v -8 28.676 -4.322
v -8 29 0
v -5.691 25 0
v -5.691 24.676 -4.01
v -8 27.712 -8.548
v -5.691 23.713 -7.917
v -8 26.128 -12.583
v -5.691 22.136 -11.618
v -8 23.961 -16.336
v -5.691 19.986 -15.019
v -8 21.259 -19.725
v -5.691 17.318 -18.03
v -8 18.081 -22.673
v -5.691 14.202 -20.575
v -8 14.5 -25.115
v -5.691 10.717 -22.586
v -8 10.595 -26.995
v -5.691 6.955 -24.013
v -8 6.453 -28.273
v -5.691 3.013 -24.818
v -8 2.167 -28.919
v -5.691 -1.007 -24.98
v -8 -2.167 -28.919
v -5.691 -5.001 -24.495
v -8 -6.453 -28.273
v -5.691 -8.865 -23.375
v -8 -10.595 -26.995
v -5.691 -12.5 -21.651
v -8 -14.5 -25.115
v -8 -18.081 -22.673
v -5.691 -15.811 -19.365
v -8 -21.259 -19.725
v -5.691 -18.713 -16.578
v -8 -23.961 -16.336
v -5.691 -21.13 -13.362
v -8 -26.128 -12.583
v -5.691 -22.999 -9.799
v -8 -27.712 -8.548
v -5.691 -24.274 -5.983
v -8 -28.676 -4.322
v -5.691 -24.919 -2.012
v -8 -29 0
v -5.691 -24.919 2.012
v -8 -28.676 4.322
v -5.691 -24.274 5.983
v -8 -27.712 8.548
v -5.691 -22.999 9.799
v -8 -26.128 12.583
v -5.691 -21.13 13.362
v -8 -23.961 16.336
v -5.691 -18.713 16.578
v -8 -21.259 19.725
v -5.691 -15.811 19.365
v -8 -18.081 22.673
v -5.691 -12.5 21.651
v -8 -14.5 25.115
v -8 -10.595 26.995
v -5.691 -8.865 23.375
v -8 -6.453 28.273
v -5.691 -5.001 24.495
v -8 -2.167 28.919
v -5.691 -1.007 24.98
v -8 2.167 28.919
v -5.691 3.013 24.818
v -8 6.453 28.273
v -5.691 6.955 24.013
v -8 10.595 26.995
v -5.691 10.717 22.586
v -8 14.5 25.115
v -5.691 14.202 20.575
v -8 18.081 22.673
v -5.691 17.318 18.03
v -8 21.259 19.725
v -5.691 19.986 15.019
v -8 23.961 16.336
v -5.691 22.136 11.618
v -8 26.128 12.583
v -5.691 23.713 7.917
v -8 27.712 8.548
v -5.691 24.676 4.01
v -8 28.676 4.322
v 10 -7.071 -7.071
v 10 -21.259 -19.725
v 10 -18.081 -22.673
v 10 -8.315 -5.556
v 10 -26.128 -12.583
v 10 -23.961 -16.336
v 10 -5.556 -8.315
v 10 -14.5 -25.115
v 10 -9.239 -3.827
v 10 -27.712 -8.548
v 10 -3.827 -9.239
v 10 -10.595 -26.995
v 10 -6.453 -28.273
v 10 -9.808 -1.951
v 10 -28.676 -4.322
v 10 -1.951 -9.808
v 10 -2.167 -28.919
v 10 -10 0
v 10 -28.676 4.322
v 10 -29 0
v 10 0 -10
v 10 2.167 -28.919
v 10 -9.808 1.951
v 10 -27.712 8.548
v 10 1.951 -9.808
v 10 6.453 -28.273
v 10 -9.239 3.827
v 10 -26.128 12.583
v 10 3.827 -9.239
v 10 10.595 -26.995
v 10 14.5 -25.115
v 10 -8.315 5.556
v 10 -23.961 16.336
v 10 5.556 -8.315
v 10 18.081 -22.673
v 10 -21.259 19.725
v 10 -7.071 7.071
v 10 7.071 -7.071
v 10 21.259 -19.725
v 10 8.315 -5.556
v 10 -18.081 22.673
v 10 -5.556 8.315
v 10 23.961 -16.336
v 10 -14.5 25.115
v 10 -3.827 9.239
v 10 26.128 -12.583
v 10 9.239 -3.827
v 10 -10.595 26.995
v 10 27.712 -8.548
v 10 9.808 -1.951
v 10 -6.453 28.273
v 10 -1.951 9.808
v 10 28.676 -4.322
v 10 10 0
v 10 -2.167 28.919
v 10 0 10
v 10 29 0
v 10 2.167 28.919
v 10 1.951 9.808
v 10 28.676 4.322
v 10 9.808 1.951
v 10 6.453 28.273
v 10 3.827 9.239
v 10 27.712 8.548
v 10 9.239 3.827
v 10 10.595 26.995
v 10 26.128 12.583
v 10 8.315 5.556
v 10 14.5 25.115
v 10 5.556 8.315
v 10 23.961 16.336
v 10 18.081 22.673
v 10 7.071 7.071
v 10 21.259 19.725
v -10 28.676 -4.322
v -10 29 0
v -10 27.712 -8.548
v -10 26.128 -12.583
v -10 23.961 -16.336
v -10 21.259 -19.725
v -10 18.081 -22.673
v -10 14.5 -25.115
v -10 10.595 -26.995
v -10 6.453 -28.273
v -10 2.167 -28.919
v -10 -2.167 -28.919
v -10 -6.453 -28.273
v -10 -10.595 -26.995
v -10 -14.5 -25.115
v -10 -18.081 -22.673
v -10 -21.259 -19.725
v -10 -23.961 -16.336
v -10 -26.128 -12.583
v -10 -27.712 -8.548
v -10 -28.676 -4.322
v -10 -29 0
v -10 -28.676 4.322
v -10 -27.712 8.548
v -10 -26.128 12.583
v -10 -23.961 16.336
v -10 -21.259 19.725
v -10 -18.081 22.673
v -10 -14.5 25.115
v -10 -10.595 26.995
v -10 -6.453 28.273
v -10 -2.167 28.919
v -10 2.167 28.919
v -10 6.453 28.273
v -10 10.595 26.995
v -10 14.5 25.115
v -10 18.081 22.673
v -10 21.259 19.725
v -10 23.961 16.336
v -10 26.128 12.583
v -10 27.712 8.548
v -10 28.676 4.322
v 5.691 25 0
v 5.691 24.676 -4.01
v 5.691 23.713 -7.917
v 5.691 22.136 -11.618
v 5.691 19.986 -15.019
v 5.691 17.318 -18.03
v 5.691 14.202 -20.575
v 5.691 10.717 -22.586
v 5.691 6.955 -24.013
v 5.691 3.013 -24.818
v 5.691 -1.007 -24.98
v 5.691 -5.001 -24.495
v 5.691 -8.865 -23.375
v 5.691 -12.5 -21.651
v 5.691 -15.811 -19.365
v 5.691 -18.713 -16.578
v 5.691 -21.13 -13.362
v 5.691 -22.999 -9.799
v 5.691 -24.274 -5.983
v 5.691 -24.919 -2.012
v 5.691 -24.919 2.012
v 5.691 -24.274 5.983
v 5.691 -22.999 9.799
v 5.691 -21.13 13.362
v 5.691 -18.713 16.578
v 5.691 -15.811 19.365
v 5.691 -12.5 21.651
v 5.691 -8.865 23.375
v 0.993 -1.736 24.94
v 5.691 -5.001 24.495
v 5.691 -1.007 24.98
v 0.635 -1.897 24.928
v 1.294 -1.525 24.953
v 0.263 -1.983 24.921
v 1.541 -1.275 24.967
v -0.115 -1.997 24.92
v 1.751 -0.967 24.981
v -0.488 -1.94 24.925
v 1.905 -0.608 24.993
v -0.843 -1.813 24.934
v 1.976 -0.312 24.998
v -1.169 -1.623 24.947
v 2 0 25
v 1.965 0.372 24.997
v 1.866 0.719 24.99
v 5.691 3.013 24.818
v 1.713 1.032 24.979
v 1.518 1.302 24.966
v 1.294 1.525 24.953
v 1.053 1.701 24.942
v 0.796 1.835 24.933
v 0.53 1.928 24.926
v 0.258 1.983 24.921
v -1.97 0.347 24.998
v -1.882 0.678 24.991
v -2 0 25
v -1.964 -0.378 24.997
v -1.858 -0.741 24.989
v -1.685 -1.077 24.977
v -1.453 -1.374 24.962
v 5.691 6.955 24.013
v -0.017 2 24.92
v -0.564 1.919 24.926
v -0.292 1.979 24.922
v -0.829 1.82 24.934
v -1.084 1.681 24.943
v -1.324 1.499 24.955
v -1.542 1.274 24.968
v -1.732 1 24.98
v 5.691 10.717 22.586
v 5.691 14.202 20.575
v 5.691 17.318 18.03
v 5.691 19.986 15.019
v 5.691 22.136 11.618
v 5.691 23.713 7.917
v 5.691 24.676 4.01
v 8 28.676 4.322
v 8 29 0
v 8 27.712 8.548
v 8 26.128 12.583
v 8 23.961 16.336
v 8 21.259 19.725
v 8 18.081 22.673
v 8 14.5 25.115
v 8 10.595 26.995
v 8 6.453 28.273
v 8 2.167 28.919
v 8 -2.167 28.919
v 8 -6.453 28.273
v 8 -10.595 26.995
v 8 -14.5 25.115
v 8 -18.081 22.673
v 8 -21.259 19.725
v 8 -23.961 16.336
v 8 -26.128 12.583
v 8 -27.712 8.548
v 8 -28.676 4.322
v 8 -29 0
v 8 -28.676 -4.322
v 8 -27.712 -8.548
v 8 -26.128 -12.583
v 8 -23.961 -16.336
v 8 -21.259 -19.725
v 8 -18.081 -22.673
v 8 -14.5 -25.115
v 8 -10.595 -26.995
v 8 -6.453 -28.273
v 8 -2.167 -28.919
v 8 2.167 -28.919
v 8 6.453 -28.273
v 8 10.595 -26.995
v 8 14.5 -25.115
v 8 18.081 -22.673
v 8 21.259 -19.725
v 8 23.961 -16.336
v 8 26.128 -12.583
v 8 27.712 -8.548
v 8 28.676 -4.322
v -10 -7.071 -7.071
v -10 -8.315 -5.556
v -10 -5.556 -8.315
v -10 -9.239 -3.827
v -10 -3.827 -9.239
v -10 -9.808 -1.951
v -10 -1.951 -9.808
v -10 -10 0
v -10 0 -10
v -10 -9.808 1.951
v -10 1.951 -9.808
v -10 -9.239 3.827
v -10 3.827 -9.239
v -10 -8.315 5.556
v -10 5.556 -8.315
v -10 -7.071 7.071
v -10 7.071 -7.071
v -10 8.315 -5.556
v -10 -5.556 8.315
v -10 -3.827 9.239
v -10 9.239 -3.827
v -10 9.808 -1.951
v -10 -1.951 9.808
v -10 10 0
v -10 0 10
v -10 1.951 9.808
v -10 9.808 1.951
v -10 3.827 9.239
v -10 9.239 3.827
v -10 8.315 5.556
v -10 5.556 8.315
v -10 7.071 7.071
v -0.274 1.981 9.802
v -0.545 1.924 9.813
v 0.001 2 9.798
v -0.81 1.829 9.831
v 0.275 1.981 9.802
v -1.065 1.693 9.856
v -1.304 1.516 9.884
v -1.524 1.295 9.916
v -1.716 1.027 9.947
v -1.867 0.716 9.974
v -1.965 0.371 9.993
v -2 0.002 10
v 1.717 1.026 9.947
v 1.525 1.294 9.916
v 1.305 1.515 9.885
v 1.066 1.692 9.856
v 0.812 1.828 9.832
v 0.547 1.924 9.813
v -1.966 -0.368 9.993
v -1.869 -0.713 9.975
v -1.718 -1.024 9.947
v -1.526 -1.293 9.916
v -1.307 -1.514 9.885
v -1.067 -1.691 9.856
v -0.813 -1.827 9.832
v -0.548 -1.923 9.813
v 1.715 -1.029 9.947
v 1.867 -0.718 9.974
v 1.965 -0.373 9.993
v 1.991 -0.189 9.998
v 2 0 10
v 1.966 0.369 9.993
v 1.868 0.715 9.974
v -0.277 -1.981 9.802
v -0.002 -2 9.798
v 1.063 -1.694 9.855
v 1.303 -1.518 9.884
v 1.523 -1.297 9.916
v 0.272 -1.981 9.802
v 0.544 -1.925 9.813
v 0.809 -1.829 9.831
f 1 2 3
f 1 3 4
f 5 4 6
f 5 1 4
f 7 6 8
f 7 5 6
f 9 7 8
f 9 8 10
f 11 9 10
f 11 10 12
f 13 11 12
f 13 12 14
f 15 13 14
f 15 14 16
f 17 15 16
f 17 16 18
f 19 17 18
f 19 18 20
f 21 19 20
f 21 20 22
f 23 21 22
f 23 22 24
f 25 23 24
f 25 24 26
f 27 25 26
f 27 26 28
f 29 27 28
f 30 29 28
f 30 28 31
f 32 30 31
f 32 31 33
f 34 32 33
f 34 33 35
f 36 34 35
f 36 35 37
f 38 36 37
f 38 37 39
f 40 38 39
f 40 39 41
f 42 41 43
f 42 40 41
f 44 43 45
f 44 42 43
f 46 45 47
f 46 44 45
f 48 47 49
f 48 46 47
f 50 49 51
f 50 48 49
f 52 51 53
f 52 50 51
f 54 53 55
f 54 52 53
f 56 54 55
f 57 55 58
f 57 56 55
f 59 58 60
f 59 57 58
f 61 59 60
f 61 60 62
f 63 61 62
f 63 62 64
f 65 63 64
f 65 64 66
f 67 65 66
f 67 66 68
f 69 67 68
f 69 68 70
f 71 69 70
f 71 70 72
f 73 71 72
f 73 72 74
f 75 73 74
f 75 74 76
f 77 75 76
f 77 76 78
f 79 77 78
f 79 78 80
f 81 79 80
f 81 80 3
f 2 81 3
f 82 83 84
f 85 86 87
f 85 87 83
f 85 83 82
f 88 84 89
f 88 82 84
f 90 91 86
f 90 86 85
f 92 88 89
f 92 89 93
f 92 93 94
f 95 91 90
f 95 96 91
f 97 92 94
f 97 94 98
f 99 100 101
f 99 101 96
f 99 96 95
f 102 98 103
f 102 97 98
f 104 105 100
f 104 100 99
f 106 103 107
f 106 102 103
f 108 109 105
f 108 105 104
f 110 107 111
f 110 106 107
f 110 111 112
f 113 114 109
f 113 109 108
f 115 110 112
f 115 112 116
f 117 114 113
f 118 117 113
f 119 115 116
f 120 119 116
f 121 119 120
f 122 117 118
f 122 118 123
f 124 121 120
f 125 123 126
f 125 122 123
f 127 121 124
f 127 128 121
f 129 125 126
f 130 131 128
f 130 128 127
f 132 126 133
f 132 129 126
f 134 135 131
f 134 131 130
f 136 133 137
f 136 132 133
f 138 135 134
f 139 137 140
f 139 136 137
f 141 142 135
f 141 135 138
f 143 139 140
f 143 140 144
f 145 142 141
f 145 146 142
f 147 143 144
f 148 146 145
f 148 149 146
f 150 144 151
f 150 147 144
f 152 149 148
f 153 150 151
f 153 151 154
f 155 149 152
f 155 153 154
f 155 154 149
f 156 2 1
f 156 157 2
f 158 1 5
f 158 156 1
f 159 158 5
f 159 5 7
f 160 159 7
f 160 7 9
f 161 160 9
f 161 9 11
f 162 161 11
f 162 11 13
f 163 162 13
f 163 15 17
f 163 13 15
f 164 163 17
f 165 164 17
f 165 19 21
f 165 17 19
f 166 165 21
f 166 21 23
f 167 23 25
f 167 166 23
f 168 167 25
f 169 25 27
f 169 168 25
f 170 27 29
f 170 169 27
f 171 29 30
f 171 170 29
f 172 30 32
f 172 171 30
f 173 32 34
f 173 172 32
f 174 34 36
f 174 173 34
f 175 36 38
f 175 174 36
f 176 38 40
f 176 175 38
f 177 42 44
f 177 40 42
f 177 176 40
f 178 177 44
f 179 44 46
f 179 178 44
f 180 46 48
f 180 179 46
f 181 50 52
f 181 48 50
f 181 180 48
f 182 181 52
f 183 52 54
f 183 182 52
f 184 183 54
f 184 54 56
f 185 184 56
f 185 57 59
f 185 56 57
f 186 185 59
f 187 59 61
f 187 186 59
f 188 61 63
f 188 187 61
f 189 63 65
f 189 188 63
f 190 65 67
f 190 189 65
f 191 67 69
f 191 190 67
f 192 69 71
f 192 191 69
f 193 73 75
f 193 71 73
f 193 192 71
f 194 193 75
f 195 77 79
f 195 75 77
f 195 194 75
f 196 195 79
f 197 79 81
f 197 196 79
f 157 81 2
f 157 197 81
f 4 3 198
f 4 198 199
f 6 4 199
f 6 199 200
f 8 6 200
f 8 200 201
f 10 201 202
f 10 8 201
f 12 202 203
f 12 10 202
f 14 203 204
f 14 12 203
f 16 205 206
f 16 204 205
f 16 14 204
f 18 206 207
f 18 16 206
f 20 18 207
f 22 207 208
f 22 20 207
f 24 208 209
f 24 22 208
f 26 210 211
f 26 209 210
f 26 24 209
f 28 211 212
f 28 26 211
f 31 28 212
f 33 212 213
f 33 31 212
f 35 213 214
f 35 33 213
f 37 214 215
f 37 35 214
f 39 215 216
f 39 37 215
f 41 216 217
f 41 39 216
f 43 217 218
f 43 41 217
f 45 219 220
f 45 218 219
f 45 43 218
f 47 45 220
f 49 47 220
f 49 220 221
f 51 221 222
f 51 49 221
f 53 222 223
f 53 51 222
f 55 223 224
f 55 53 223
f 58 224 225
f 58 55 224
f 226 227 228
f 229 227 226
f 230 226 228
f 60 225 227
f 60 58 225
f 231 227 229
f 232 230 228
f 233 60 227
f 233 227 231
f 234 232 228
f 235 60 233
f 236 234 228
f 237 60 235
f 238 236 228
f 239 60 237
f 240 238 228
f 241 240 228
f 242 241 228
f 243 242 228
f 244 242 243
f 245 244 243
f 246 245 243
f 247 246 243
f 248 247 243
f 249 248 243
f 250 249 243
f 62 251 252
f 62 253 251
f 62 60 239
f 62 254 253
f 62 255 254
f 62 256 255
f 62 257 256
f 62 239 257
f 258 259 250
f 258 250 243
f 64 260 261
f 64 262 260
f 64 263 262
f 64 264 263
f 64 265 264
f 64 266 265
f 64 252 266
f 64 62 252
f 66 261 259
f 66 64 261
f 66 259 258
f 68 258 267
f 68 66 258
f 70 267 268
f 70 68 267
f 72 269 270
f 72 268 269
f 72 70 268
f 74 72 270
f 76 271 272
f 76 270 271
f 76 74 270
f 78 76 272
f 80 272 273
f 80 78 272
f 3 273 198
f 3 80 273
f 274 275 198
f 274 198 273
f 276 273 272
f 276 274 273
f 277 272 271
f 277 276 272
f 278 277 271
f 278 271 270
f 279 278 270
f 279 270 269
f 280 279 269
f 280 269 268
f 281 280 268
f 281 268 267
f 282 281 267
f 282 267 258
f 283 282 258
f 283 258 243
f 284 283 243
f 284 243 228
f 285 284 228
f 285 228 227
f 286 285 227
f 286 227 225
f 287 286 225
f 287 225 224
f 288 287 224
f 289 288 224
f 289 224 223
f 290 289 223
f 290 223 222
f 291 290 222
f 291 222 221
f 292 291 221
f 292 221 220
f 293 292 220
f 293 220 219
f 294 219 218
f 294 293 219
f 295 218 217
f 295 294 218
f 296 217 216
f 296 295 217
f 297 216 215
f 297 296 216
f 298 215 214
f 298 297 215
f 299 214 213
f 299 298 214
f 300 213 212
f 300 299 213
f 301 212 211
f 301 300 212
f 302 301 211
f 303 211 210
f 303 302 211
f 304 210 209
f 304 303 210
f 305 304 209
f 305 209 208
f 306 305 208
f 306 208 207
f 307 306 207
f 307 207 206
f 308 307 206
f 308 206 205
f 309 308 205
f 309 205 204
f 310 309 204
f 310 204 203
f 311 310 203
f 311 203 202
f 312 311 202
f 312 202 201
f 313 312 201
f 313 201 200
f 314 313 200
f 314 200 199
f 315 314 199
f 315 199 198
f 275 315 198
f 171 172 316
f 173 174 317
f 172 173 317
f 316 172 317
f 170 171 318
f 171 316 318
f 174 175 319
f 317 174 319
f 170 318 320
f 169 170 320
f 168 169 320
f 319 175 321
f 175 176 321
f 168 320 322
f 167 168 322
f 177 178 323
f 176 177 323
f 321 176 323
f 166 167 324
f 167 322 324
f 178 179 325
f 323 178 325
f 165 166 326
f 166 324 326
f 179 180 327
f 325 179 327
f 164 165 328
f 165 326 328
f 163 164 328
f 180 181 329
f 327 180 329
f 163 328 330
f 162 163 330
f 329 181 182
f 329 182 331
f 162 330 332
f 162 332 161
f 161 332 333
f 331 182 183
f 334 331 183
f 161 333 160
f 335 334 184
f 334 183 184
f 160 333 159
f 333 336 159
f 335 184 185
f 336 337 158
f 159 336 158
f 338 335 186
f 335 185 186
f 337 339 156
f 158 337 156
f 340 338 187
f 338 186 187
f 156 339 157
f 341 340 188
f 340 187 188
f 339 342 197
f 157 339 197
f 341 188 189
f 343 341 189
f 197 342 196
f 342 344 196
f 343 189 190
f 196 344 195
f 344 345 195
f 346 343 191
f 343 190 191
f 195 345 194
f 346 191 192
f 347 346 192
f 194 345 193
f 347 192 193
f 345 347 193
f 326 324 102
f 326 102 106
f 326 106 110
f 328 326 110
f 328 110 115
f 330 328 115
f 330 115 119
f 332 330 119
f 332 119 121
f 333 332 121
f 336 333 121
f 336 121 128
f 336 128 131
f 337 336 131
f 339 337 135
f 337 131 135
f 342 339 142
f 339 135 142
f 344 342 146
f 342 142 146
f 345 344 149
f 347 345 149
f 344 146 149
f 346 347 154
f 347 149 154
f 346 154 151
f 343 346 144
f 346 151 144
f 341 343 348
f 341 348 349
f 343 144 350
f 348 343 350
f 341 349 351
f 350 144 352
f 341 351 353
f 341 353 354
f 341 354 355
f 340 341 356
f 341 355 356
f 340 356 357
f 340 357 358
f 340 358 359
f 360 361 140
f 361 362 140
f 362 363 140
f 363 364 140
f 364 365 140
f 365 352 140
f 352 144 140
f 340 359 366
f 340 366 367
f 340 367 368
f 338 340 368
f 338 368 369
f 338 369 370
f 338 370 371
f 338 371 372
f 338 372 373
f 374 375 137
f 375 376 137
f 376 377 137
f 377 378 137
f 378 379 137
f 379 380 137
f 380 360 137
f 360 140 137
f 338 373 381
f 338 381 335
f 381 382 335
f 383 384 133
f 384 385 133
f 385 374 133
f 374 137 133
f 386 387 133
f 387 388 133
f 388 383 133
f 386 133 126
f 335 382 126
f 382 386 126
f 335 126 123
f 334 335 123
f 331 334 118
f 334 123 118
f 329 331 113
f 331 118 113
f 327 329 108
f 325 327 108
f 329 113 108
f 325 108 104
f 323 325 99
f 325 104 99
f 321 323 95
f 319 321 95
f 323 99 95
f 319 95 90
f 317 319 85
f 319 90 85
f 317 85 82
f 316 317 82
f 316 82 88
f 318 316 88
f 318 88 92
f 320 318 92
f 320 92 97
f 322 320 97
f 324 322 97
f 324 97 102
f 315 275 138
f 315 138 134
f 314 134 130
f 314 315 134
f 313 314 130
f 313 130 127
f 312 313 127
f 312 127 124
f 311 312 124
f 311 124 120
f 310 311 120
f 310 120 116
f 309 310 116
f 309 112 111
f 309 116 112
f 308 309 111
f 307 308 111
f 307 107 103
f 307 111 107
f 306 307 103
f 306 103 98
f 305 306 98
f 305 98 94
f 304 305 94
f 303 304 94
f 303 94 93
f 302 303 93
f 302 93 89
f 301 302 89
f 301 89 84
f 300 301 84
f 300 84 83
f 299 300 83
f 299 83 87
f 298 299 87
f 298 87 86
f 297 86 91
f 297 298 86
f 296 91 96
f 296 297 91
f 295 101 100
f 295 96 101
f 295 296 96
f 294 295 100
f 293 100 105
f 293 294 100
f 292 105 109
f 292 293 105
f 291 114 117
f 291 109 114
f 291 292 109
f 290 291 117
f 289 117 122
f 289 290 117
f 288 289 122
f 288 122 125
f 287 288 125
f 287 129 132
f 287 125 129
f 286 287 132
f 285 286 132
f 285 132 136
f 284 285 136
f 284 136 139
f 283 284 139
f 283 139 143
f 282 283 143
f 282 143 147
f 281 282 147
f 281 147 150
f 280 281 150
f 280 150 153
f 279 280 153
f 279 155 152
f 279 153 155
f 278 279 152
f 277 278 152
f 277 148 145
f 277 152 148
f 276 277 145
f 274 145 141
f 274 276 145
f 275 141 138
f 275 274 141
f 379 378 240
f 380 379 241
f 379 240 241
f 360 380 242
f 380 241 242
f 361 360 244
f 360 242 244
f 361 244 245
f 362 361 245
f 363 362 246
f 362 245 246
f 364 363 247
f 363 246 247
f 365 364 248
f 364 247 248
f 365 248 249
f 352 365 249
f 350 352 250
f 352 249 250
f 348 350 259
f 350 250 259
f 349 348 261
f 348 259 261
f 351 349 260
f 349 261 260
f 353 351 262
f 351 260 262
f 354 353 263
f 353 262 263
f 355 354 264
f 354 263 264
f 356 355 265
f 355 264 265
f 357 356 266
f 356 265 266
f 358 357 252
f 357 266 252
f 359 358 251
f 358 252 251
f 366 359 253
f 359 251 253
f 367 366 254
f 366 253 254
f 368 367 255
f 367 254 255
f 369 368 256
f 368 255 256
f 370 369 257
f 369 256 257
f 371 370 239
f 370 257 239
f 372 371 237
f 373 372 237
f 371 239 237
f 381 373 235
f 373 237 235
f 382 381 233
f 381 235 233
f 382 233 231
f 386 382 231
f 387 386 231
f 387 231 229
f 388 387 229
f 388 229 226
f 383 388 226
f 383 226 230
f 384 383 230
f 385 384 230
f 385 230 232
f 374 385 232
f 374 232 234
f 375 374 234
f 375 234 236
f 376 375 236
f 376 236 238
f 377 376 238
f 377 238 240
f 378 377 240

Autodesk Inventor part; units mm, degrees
ref_plane "YZ Plane" through (0, 0, 0) normal (1, 0, 0) x (0, 1, 0)
ref_plane "XZ Plane" through (0, 0, 0) normal (0, 1, 0) x (-1, 0, 0)
sketch "草图1" plane through (0, 0, 0) normal (0, 0, 1) x (1, 0, 0)
  line L0 (-10, 0) -> (10, 0)
  line L1 (10, 0) -> (10, 29)
  line L2 (10, 29) -> (8, 29)
  line L3 (8, 29) -> (5.6906, 25)
  line L4 (5.6906, 25) -> (-5.6906, 25)
  line L5 (-5.6906, 25) -> (-8, 29)
  line L6 (-8, 29) -> (-10, 29)
  line L7 (-10, 29) -> (-10, 0)
  line L8 (-14, 0) -> (14, 0) projected
  point P0 (0, 0)
  point P1 (0, 0)
  dimension "d1" = 29
  dimension "d2" = 4
  dimension "d4" = 20
  dimension "d5" = 2
  dimension "d6" = 120
  dimension "d7" = 120
  dimension "d8" = 2
revolve "旋转1" add sketch "草图1" angle 360 about axis through (-10, 0, 0) along (1, 0, 0)
sketch "草图2" plane through (10, 0, 0) normal (1, 0, 0) x (0, 0, -1)
  circle A0 centre (0, 0) radius 10
  dimension "d10" = 20
extrude "拉伸1" cut sketch "草图2" against normal through all
ref_plane "工作平面1" through (0, 0, 25) normal (0, 0, 1) x (1, 0, 0)
sketch "草图3" plane through (0, 0, 25) normal (0, 0, 1) x (1, 0, 0)
  circle A0 centre (0, 0) radius 2
  dimension "d13" = 4
extrude "拉伸2" cut sketch "草图3" against normal up to surface
thread "螺纹1" size "M4x0.7" class "6H" standard "ANSI Metric M Profile" full length
properties part number "砂轮电机皮带轮"
